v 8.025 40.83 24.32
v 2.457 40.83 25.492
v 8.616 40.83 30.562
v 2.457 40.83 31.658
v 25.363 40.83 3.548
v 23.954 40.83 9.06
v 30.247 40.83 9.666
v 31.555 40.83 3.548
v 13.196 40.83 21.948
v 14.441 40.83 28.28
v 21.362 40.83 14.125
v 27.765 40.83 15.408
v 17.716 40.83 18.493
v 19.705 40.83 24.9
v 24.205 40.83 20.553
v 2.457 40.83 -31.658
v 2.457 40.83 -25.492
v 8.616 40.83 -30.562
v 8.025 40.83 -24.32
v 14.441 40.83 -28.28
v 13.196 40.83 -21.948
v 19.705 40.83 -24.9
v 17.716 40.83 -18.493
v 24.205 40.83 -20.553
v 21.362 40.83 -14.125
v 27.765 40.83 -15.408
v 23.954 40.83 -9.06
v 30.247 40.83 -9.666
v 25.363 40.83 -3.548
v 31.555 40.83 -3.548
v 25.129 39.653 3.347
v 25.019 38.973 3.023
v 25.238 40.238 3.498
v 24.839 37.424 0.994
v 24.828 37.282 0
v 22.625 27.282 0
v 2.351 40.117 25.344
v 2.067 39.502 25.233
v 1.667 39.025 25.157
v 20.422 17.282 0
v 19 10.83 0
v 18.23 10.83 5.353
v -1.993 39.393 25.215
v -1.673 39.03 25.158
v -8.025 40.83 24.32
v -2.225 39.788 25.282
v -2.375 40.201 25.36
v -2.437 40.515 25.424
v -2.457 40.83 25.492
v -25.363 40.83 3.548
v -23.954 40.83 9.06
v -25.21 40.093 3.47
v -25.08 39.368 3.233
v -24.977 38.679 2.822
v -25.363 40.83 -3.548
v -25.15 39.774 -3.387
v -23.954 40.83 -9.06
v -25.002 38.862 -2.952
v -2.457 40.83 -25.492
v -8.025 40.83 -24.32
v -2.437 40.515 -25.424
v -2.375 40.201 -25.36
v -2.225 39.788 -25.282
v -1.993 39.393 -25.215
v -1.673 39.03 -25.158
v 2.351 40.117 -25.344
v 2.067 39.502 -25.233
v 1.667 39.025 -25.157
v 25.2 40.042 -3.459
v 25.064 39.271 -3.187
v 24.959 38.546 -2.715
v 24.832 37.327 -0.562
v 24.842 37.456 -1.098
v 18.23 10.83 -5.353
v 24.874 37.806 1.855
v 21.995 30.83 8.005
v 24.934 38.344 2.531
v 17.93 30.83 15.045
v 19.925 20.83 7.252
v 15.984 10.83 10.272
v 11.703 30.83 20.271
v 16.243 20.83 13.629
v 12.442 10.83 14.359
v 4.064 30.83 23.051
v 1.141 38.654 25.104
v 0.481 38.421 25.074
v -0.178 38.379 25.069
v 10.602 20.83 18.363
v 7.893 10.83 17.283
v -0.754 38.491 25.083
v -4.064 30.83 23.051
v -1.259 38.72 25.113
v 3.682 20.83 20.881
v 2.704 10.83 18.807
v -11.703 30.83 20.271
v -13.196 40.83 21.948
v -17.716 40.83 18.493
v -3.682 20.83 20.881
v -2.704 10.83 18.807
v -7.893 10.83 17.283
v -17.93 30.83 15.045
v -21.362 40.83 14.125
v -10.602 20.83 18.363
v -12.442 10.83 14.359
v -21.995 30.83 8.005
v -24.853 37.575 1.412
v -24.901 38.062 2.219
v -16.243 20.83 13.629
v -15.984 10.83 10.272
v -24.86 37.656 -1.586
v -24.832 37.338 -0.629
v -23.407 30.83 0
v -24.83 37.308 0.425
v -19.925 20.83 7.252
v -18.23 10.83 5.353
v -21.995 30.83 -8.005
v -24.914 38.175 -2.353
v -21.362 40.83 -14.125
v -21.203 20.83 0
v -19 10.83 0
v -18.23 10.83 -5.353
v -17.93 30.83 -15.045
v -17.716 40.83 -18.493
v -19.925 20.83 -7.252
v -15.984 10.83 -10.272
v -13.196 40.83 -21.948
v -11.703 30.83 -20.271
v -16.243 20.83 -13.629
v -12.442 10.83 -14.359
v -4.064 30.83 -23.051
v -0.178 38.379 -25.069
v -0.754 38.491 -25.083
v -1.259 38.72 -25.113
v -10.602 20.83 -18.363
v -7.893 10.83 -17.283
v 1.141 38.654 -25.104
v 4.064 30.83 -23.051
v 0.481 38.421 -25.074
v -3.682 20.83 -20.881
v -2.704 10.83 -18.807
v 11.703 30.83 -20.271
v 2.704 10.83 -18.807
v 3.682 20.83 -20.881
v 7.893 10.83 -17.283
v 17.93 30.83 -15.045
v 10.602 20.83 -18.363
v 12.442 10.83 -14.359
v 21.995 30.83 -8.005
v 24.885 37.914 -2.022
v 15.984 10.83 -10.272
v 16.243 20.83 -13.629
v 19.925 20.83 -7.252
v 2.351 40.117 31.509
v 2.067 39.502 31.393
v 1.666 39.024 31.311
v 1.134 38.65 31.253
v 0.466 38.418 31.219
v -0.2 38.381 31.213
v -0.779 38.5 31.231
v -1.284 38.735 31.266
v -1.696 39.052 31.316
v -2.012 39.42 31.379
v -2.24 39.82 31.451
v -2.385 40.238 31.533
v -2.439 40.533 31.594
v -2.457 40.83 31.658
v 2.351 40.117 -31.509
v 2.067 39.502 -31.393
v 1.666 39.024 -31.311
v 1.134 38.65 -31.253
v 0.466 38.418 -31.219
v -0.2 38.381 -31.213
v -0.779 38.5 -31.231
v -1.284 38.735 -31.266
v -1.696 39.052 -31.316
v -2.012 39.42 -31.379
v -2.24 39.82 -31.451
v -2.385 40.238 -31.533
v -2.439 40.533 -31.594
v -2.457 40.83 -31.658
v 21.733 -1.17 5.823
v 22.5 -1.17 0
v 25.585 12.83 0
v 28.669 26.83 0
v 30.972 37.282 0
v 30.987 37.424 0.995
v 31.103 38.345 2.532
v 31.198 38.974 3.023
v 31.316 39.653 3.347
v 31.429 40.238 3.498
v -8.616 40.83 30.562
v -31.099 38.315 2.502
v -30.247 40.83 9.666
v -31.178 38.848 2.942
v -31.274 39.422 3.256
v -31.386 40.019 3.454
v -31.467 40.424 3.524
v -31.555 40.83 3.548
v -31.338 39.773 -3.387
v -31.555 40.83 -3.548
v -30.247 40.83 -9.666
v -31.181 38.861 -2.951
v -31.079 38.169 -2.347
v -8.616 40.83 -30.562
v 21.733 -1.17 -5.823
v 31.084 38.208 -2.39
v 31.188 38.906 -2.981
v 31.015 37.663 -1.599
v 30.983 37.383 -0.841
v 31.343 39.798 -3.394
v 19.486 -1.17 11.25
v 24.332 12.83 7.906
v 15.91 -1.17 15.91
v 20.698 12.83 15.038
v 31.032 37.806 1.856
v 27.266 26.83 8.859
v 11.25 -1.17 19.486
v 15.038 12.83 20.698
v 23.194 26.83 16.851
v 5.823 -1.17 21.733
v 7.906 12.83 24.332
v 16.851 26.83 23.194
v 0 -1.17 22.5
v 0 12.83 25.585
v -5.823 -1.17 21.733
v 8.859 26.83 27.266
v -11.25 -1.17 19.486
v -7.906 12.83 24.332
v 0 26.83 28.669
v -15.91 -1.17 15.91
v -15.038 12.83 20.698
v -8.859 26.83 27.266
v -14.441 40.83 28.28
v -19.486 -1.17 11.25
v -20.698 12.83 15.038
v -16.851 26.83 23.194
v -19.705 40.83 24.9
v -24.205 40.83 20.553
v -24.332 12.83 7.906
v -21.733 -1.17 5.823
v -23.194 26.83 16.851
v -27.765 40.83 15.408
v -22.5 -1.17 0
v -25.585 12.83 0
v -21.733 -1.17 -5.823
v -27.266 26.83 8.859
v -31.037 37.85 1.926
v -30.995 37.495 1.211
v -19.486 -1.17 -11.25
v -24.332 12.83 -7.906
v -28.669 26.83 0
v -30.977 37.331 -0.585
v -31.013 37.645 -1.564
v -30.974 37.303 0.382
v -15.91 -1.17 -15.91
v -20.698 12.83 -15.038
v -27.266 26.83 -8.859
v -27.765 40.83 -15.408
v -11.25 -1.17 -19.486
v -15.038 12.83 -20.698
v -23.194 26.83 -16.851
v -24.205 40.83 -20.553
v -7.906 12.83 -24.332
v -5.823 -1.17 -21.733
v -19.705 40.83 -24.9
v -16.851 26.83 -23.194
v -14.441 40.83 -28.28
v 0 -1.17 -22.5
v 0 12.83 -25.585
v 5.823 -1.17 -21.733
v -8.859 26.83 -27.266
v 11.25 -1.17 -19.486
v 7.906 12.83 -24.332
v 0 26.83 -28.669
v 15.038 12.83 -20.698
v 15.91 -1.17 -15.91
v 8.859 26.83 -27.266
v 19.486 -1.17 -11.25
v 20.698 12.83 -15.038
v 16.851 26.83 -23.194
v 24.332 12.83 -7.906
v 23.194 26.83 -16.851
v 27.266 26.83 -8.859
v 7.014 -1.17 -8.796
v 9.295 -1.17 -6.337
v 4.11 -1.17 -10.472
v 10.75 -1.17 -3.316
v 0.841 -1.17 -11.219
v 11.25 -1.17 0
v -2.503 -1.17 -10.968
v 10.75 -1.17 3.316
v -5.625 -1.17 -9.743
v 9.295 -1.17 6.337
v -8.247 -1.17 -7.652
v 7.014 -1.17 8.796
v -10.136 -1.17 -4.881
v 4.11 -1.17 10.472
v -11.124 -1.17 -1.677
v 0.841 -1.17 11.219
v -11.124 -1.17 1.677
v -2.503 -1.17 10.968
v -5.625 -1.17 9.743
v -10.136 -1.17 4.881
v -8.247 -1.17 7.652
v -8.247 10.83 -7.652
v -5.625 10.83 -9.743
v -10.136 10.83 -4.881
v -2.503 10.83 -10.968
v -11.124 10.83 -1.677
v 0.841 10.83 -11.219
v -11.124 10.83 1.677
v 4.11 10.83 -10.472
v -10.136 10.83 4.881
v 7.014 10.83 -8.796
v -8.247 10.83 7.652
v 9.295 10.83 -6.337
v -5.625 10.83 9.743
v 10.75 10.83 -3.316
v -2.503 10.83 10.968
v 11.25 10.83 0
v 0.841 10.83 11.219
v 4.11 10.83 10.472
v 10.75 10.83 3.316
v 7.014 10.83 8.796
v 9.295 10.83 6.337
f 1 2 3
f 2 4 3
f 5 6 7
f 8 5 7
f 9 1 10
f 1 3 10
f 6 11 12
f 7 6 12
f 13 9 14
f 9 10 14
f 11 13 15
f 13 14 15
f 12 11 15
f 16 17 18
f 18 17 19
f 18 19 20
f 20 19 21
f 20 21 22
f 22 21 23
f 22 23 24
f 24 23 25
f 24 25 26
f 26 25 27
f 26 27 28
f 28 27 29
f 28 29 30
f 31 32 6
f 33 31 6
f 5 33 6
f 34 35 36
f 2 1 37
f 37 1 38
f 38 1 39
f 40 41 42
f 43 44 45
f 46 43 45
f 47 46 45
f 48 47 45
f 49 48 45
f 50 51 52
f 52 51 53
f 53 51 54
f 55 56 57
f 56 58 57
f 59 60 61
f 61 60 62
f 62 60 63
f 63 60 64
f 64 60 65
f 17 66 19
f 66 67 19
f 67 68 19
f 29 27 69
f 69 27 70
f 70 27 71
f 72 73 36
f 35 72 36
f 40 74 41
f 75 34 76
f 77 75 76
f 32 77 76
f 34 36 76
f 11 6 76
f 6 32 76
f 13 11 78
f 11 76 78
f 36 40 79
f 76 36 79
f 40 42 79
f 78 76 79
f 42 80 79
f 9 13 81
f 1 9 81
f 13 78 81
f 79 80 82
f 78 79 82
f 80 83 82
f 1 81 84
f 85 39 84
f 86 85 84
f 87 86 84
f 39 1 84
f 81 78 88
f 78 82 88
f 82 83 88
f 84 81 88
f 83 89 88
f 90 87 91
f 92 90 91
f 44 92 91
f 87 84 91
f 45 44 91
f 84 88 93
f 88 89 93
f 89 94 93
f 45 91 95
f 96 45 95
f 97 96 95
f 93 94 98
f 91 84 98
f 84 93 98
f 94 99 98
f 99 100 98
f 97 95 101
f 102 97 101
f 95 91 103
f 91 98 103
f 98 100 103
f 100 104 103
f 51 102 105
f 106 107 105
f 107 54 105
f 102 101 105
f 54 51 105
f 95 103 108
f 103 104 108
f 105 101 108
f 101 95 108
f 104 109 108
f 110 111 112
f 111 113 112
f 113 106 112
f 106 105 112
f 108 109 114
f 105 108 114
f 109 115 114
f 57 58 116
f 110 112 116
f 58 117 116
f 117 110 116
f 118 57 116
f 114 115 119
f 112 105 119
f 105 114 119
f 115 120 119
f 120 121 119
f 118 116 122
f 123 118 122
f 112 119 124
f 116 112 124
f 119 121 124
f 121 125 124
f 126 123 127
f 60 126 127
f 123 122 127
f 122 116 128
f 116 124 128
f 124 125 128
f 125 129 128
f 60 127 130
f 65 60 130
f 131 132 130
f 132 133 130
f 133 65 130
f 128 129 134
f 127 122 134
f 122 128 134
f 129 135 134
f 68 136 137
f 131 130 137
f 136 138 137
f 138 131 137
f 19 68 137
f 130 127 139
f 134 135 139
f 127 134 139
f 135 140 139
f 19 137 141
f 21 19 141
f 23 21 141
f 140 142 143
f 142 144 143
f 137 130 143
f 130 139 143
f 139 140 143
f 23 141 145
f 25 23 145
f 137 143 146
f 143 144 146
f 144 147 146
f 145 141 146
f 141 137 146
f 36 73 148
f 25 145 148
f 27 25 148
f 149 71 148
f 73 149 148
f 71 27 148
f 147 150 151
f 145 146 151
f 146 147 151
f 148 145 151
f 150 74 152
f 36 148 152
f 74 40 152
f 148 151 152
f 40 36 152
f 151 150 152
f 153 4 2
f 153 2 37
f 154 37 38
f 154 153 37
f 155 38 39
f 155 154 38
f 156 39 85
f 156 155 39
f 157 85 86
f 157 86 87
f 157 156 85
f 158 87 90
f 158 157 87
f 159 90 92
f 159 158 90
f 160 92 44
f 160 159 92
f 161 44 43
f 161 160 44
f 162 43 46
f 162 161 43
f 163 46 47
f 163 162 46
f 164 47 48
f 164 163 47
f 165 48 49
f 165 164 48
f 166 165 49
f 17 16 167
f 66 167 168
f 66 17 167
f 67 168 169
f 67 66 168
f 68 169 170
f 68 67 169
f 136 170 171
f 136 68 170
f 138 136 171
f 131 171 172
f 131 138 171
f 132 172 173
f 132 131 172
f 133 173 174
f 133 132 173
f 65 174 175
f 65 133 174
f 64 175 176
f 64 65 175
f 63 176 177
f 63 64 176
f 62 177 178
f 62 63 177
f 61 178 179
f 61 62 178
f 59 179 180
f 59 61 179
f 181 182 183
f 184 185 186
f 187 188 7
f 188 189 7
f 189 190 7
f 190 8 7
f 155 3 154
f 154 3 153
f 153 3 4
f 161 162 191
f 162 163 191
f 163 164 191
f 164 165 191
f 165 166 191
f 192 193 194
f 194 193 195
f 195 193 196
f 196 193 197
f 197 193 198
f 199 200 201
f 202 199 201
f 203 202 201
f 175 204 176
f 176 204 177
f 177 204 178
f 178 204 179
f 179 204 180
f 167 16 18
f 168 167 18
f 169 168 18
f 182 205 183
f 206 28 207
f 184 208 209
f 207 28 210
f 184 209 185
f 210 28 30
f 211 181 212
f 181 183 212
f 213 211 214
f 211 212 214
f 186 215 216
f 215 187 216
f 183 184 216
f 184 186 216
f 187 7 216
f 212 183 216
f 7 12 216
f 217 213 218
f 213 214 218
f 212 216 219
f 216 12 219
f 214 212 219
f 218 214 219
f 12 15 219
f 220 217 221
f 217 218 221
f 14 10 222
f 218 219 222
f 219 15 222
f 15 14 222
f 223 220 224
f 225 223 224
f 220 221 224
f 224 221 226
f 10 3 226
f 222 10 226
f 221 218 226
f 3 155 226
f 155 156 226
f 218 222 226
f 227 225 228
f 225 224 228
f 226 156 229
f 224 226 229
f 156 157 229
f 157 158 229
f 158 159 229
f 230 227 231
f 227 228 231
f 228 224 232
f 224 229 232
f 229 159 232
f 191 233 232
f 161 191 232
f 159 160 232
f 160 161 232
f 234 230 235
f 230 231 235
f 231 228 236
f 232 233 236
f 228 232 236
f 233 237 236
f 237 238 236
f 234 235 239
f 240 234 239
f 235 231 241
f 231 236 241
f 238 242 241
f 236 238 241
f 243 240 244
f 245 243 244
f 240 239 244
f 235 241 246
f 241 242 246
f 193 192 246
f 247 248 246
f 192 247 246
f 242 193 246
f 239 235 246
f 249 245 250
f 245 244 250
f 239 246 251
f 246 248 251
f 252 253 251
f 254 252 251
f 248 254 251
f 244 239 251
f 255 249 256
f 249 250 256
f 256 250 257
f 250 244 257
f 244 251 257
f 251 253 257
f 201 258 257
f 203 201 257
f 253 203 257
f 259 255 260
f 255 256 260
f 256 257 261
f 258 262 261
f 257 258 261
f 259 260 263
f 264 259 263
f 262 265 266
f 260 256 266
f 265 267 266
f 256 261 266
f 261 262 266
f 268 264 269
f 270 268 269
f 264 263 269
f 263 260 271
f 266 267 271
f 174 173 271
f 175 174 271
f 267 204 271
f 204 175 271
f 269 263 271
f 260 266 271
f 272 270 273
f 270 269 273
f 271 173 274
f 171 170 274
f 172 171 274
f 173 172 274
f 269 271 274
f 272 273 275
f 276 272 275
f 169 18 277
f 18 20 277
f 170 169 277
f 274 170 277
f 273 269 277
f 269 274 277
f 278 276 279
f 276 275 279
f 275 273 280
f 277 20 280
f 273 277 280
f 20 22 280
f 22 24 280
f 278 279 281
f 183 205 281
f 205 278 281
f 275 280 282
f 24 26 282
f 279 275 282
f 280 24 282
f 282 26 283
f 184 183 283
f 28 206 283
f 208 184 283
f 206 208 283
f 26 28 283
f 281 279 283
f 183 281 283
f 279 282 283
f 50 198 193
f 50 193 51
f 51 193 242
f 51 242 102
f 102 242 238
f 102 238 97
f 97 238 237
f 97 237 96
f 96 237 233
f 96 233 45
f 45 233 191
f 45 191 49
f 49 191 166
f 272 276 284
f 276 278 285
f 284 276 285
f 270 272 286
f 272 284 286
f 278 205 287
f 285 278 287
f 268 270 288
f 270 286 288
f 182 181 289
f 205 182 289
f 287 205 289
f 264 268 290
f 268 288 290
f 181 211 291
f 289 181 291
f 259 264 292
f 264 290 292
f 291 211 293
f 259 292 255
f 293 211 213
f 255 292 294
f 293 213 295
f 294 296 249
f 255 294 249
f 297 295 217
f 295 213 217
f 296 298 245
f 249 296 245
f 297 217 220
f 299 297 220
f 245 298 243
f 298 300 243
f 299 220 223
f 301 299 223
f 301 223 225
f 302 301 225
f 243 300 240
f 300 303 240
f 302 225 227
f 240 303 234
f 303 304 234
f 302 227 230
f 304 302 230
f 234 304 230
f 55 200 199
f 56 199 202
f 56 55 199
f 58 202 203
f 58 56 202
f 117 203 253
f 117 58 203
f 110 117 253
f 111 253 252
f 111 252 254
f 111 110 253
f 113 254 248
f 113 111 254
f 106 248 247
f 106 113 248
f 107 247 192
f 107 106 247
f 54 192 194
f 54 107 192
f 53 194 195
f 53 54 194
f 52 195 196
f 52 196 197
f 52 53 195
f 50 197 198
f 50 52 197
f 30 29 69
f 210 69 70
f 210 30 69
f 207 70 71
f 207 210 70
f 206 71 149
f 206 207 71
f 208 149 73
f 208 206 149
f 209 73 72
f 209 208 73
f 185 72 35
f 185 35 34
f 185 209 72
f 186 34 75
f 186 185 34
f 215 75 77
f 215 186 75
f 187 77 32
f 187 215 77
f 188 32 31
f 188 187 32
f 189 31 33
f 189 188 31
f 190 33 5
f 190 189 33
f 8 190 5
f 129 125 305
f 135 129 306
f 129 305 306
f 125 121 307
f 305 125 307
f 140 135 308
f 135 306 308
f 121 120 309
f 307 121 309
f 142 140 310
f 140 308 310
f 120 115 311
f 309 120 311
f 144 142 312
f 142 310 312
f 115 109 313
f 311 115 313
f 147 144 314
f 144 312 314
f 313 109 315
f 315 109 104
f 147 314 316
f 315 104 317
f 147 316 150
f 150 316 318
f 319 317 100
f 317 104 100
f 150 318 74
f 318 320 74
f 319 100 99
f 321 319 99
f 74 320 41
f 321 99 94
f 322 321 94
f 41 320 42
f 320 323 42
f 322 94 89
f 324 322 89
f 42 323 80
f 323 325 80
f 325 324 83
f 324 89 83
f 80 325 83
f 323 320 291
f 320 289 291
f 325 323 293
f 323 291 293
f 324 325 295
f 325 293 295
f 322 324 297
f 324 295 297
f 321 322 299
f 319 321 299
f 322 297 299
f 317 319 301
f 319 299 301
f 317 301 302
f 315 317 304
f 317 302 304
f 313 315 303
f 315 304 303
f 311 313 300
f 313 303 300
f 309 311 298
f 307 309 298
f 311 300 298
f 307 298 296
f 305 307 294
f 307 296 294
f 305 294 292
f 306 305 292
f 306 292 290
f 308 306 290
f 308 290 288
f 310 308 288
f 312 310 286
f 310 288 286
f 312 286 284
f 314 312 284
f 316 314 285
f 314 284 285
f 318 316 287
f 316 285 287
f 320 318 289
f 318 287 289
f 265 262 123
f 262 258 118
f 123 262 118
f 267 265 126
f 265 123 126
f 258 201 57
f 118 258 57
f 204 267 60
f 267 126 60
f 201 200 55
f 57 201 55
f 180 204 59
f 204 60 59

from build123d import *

# Parameters (mm, degrees)
CUT_EXTRUDE1_DEPTH = 50
CUT_EXTRUDE2_DEPTH = 50


with BuildPart() as part:
    # Sketch1 → Revolve1 (revolve)
    with BuildSketch(Plane.XY):
        Polygon((11.25, 10.82996466), (11.25, -1.17003534), (22.5, -1.17003534), (31.753664233, 40.82996466), (25.609760166, 40.82996466), (19, 10.82996466), align=None)
    revolve(axis=Axis((0, 29.136855034, 0), (0, -1, 0)))

    # Sketch2 → Cut-Extrude1 (cut, symmetric)
    with BuildSketch(Plane(origin=(0, 0, 0), x_dir=(0, 0, -1), z_dir=(1, 0, 0))):
        with BuildLine():
            Line((-3.547836686, 40.82996466), (3.547836686, 40.82996466))
            ThreePointArc((3.547836686, 40.82996466), (0, 37.282127974), (-3.547836686, 40.82996466))
        make_face()
    extrude(amount=CUT_EXTRUDE1_DEPTH, both=True, mode=Mode.SUBTRACT)

    # Sketch3 → Cut-Extrude2 (cut, symmetric)
    with BuildSketch(Plane.XY):
        with BuildLine():
            Line((-2.456970945, 40.82996466), (2.456970945, 40.82996466))
            ThreePointArc((2.456970945, 40.82996466), (0, 38.372993715), (-2.456970945, 40.82996466))
        make_face()
    extrude(amount=CUT_EXTRUDE2_DEPTH, both=True, mode=Mode.SUBTRACT)


solid = part.part
